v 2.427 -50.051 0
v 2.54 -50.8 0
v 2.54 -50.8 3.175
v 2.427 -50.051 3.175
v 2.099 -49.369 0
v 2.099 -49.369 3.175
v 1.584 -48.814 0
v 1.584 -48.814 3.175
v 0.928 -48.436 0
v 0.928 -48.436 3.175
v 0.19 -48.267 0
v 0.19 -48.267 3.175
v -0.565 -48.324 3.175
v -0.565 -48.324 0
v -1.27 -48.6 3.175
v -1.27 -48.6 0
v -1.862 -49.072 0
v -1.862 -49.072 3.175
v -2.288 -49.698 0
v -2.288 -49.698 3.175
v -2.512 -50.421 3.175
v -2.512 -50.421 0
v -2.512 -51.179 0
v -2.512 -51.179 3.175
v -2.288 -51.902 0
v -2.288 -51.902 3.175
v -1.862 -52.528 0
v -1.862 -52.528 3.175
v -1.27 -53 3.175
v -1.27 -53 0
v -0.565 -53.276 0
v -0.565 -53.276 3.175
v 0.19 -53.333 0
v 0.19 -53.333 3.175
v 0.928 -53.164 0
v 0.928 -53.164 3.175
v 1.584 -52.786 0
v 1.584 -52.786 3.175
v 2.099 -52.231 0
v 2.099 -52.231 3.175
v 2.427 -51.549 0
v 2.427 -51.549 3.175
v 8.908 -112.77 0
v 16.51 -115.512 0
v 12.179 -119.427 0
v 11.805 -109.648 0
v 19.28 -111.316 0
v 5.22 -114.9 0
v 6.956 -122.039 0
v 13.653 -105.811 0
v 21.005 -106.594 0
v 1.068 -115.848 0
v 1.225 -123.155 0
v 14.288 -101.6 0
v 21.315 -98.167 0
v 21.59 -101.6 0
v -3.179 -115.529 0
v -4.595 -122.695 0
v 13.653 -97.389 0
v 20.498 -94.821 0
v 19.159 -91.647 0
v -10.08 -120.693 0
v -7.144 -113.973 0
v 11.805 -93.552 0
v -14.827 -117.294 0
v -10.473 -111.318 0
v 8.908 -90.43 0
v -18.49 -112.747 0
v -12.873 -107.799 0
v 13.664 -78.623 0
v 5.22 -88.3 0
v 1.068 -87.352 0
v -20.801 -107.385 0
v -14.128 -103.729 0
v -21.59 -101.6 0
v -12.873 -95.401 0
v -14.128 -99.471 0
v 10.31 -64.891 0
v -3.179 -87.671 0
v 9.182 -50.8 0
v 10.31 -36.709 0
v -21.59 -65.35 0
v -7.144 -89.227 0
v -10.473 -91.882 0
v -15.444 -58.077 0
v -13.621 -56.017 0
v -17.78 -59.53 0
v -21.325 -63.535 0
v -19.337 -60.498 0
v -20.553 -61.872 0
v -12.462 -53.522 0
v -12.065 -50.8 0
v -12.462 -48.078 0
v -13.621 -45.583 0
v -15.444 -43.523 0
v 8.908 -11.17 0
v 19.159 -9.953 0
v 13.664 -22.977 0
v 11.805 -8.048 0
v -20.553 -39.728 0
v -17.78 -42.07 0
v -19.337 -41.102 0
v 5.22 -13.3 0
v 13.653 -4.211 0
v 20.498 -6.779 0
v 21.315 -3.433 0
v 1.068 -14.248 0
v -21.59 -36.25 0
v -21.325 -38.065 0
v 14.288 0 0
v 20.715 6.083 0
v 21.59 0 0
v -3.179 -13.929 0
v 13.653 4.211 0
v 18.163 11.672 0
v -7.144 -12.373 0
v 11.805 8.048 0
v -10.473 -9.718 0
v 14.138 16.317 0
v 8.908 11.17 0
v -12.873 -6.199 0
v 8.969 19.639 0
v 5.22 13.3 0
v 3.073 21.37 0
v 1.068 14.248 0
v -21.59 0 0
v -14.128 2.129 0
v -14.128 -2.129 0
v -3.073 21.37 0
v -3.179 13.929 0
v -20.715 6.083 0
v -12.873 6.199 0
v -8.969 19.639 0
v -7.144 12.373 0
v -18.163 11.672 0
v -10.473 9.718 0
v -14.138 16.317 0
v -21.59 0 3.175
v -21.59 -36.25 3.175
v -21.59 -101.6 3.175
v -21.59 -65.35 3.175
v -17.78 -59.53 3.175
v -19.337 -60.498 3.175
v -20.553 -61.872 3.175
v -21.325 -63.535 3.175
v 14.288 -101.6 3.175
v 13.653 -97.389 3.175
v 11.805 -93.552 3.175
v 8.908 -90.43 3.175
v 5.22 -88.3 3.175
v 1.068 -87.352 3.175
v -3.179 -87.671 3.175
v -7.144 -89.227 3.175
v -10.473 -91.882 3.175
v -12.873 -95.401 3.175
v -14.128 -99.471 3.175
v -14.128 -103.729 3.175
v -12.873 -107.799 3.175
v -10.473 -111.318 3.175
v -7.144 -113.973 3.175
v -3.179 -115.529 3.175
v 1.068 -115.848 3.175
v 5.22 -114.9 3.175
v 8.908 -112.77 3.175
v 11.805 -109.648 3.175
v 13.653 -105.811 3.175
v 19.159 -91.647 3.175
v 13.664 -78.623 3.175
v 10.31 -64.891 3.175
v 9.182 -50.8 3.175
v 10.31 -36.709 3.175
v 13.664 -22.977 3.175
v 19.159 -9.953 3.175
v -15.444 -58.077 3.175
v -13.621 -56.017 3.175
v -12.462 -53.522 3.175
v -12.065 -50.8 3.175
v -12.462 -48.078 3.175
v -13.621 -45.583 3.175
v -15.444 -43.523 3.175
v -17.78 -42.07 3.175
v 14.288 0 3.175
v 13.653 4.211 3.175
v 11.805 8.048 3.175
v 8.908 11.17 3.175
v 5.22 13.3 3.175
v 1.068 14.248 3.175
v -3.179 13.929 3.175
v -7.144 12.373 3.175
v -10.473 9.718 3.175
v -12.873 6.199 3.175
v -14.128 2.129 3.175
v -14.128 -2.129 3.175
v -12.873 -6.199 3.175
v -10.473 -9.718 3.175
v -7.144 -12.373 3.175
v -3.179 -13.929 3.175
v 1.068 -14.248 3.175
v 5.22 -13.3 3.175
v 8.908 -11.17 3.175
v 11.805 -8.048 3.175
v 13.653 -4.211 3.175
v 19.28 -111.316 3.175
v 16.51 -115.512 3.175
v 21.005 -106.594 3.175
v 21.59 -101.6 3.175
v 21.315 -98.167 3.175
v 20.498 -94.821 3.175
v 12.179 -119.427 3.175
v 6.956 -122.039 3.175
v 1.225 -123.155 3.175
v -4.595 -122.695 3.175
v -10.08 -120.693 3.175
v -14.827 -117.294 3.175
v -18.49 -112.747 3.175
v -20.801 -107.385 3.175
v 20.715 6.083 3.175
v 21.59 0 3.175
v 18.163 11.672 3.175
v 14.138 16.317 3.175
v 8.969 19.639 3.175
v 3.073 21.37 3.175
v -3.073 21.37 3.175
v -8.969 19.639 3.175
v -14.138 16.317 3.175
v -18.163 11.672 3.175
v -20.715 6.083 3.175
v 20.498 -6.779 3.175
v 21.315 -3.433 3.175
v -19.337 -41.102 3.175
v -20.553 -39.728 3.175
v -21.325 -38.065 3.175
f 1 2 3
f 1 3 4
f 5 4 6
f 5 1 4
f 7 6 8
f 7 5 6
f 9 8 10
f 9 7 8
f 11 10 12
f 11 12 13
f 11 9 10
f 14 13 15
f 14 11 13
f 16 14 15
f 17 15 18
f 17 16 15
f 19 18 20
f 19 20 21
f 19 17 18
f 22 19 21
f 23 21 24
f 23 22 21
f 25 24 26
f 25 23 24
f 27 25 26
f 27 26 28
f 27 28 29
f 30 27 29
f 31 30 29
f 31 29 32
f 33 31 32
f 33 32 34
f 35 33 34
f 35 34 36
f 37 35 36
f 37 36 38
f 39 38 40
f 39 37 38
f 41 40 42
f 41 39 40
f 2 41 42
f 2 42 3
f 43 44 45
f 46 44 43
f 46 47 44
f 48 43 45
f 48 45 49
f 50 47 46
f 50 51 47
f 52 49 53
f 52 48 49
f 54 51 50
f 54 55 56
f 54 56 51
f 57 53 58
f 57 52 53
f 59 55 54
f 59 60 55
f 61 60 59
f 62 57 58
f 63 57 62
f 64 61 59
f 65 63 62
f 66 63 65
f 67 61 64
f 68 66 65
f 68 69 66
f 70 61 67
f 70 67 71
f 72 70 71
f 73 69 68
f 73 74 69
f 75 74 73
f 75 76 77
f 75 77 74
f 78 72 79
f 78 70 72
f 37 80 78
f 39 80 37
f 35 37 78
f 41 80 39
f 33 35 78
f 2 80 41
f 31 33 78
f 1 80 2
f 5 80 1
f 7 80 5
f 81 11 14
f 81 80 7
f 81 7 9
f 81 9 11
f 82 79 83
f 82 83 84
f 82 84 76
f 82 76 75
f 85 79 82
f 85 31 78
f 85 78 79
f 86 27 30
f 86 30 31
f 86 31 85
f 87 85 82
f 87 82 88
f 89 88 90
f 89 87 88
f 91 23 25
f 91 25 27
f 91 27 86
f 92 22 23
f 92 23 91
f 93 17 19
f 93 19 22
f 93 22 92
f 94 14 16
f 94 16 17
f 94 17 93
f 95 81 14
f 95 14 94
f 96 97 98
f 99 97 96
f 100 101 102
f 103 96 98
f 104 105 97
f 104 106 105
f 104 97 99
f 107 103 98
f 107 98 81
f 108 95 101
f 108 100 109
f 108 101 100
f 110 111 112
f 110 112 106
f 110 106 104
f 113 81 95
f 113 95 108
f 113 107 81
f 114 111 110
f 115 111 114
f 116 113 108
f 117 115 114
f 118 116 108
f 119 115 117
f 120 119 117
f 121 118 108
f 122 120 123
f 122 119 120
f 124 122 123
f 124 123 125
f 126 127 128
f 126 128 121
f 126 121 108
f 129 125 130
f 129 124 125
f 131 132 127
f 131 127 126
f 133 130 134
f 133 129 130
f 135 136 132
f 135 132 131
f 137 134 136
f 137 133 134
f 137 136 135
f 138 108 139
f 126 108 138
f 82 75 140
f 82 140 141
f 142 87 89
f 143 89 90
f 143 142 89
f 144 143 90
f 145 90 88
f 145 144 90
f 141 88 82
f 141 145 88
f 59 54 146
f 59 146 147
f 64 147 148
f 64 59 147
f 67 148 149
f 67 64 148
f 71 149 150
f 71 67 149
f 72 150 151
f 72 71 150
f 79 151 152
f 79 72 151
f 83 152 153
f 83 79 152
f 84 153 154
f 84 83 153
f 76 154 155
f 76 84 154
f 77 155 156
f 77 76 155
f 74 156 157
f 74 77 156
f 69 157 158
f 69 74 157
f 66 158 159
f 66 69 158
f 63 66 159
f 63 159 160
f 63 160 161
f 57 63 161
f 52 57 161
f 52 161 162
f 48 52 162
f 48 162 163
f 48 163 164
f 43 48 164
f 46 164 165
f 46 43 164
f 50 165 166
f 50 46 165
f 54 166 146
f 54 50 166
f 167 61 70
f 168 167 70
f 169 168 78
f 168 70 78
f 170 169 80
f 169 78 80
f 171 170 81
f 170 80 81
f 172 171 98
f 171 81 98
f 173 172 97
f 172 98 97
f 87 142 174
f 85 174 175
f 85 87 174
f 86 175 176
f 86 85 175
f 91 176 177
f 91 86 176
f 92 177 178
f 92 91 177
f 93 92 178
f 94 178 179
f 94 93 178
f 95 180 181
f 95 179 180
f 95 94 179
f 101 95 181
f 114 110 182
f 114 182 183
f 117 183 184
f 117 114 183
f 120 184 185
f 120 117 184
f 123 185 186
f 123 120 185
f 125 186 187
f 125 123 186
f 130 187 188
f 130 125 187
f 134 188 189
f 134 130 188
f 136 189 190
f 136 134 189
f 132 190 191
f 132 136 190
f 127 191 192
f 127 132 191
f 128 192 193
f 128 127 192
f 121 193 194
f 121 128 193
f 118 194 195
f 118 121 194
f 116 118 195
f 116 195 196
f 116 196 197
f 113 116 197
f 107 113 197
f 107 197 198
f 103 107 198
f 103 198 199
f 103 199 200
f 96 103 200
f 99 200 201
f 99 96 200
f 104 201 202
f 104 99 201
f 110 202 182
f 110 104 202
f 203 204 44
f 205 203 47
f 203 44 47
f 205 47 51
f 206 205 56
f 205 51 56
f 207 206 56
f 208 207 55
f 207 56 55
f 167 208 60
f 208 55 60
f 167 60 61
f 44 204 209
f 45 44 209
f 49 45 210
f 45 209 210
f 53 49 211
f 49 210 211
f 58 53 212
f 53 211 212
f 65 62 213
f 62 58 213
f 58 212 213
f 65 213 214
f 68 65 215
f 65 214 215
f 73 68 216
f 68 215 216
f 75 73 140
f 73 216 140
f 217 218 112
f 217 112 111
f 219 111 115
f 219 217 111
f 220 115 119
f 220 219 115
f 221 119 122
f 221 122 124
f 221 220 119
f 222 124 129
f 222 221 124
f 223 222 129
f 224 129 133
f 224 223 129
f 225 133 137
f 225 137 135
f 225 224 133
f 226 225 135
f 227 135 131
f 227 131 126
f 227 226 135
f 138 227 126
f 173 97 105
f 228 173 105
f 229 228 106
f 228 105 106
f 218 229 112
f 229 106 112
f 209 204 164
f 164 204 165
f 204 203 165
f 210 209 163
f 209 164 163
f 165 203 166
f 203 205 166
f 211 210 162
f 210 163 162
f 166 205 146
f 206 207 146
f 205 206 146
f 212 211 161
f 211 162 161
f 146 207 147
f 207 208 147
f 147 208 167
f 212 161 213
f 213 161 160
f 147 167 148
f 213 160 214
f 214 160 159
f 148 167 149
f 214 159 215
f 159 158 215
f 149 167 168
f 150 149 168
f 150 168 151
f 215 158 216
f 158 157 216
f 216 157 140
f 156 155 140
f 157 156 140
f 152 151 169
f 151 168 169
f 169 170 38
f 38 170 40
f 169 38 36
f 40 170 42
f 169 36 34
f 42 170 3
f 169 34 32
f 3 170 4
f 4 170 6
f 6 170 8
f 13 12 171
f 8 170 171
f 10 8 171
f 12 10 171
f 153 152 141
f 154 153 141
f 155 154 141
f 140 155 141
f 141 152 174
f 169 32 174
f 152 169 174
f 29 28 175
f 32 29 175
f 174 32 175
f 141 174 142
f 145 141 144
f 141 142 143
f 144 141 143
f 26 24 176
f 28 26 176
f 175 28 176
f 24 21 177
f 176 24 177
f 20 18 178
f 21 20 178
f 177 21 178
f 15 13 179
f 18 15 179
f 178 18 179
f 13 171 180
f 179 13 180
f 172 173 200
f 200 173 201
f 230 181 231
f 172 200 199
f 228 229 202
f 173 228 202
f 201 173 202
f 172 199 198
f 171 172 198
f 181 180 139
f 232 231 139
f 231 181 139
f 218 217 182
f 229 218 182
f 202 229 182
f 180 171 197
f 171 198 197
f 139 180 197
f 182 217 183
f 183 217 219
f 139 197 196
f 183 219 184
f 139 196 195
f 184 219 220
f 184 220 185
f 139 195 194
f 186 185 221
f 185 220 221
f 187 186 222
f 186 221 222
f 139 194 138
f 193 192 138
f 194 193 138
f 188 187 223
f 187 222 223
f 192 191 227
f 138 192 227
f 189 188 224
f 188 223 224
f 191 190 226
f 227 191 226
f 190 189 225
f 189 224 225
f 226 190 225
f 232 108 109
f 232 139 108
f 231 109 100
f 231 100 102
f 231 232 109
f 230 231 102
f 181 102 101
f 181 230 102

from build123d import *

# Parameters (mm, degrees)
SKETCH1_R           = 14.2875
SKETCH1_R_2         = 2.54
BOSS_EXTRUDE1_DEPTH = 3.175
CUT_EXTRUDE1_DEPTH  = 162.674043733
FILLET3_R           = 6.35
SKETCH3_R           = 2.54
BOSS_EXTRUDE3_DEPTH = 3.175
SKETCH6_R           = 2.54
BOSS_EXTRUDE4_DEPTH = 3.175
FILLET2_R           = 6.35
CUT_EXTRUDE2_DEPTH  = 169.237022961
CUT_EXTRUDE3_DEPTH  = 169.237022961
CUT_EXTRUDE4_DEPTH  = 168.265702461


with BuildPart() as part:
    # Sketch1 → Boss-Extrude1 (new body)
    with BuildSketch(Plane.XY):
        with BuildLine():
            Line((-8.89, 25.4), (8.89, 25.4))
            ThreePointArc((8.89, 25.4), (17.870256121, 21.680256121), (21.59, 12.7))
            Line((21.59, 12.7), (21.59, -117.775079775))
            ThreePointArc((21.59, -117.775079775), (21.127743647, -120.388718212), (19.797058824, -122.685251408))
            Line((19.797058824, -122.685251408), (-7.952696208, -155.616779465))
            ThreePointArc((-7.952696208, -155.616779465), (-12.268297602, -157.851943494), (-16.900388255, -156.380852124))
            Line((-16.900388255, -156.380852124), (-32.439211784, -143.287061102))
            ThreePointArc((-32.439211784, -143.287061102), (-34.674375812, -138.971459708), (-33.203284443, -134.339369055))
            Line((-33.203284443, -134.339369055), (-23.382941176, -122.685251408))
            ThreePointArc((-23.382941176, -122.685251408), (-22.052256353, -120.388718212), (-21.59, -117.775079775))
            Line((-21.59, -117.775079775), (-21.59, 12.7))
            ThreePointArc((-21.59, 12.7), (-17.870256121, 21.680256121), (-8.89, 25.4))
        make_face()
        Circle(SKETCH1_R, mode=Mode.SUBTRACT)
        with Locations((0, -101.6)):
            Circle(SKETCH1_R, mode=Mode.SUBTRACT)
        with Locations((-18.532085478, -142.550133084)):
            Circle(SKETCH1_R_2, mode=Mode.SUBTRACT)
        with Locations((0, -50.8)):
            Circle(SKETCH1_R_2, mode=Mode.SUBTRACT)
    extrude(amount=BOSS_EXTRUDE1_DEPTH)

    # Sketch2 → Cut-Extrude1 (cut, through all)
    with BuildSketch(Plane.XY):
        with BuildLine():
            ThreePointArc((19.159083004, -91.647229609), (9.182340769, -50.8), (19.159083004, -9.952770391))
            ThreePointArc((19.159083004, -9.952770391), (20.973467787, -5.122670102), (21.59, 0))
            Line((21.59, 0), (27.94, 0))
            Line((27.94, 0), (27.94, -121.656687185))
            Line((27.94, -121.656687185), (-7.620284479, -163.8572221))
            Line((-7.620284479, -163.8572221), (-17.501317584, -155.874478972))
            Line((-17.501317584, -155.874478972), (16.51, -115.512152961))
            ThreePointArc((16.51, -115.512152961), (20.280273667, -109.005308906), (21.59, -101.6))
            ThreePointArc((21.59, -101.6), (20.973467787, -96.477329898), (19.159083004, -91.647229609))
        make_face()
        with BuildLine():
            Line((-21.59, -41.275), (-21.59, -60.325))
            ThreePointArc((-21.59, -60.325), (-12.065, -50.8), (-21.59, -41.275))
        make_face()
    extrude(amount=CUT_EXTRUDE1_DEPTH, mode=Mode.SUBTRACT)


with BuildPart() as cut_extrude1_piece_1:
    # of the separate pieces the step leaves, piece 1, a body of its own (cut_extrude1_pieces)
    add(part.part.solids().sort_by_distance((-8.89, 25.4, 0))[0])

    # Fillet3
    fillet3_edges = [cut_extrude1_piece_1.edges().sort_by_distance(p)[0] for p in [
        (-21.59, -41.275, 1.5875),
        (-21.59, -60.325, 1.5875),
    ]]
    fillet(fillet3_edges, radius=FILLET3_R)

    # Sketch3 → Boss-Extrude3 (add)
    with BuildSketch(Plane.XY.offset(3.175)):
        with BuildLine():
            Line((-27.351416194, -127.394768527), (-36.025496499, -137.688579))
            ThreePointArc((-36.025496499, -137.688579), (-37.217489152, -141.441859142), (-35.4063854, -144.93869507))
            Line((-35.4063854, -144.93869507), (-24.403104784, -154.210610454))
            ThreePointArc((-24.403104784, -154.210610454), (-19.771014132, -155.681701823), (-15.455412737, -153.446537795))
            Line((-15.455412737, -153.446537795), (-7.557639641, -144.073996091))
            Line((-7.557639641, -144.073996091), (-27.351416194, -127.394768527))
        make_face()
        with Locations((-18.532085478, -142.550133084)):
            Circle(SKETCH3_R, mode=Mode.SUBTRACT)
    extrude(amount=-BOSS_EXTRUDE3_DEPTH)

    # Sketch6 → Boss-Extrude4 (add)
    with BuildSketch(Plane.XY.offset(3.175)):
        Polygon((-35.4063854, -144.93869507), (-63.620410749, -121.164144113), (-51.344981666, -106.596497054), (-27.065569901, -127.055545526), align=None)
        with Locations((-52.626813855, -117.972130278)):
            Circle(SKETCH6_R, mode=Mode.SUBTRACT)
    extrude(amount=-BOSS_EXTRUDE4_DEPTH)

    # Fillet2
    fillet2_edges = [cut_extrude1_piece_1.edges().sort_by_distance(p)[0] for p in [
        (-63.620410749, -121.164144113, 1.5875),
        (-51.344981666, -106.596497054, 1.5875),
        (-27.065569901, -127.055545526, 1.5875),
    ]]
    fillet(fillet2_edges, radius=FILLET2_R)

    # Sketch7 → Cut-Extrude2 (cut, through all)
    with BuildSketch(Plane.XY.offset(3.175)):
        with BuildLine():
            Line((-21.59, 0), (-21.59, 31.75))
            Line((-21.59, 31.75), (21.59, 31.75))
            Line((21.59, 31.75), (21.59, 0))
            ThreePointArc((21.59, 0), (0, 21.59), (-21.59, 0))
        make_face()
    extrude(amount=-CUT_EXTRUDE2_DEPTH, mode=Mode.SUBTRACT)


with BuildPart() as cut_extrude1_piece_2:
    # of the separate pieces the step leaves, piece 2, a body of its own (cut_extrude1_pieces)
    add(part.part.solids().sort_by_distance((-16.900388255, -156.380852124, 0))[0])


with BuildPart() as cut_extrude3_tool:
    # Sketch10 → Cut-Extrude3 (new, through all)
    with BuildSketch(Plane.XY.offset(3.175)):
        with BuildLine():
            Line((-18.151882461, -155.32628042), (-17.361482582, -157.512020269))
            Line((-17.361482582, -157.512020269), (-14.375706423, -156.432313955))
            Line((-14.375706423, -156.432313955), (-15.455412737, -153.446537795))
            ThreePointArc((-15.455412737, -153.446537795), (-16.679911193, -154.563907595), (-18.151882461, -155.32628042))
        make_face()
    extrude(amount=-CUT_EXTRUDE3_DEPTH)


with BuildPart() as cut_extrude1_piece_1_1:
    add(cut_extrude1_piece_1.part)

    # Cut-Extrude3: cut by cut_extrude3_tool
    add(cut_extrude3_tool.part, mode=Mode.SUBTRACT)

    # Sketch12 → Cut-Extrude4 (cut, through all)
    with BuildSketch(Plane.XY.offset(3.175)):
        with BuildLine():
            Line((-21.59, -101.6), (-72.39, -101.6))
            Line((-72.39, -101.6), (-72.39, -165.1))
            Line((-72.39, -165.1), (16.51, -165.1))
            Line((16.51, -165.1), (16.51, -115.512152961))
            ThreePointArc((16.51, -115.512152961), (-7.405308906, -121.880273667), (-21.59, -101.6))
        make_face()
    extrude(amount=-CUT_EXTRUDE4_DEPTH, mode=Mode.SUBTRACT)


with BuildPart() as cut_extrude1_piece_2_1:
    add(cut_extrude1_piece_2.part)

    # Cut-Extrude3: cut by cut_extrude3_tool
    add(cut_extrude3_tool.part, mode=Mode.SUBTRACT)


solid = cut_extrude1_piece_1_1.part
